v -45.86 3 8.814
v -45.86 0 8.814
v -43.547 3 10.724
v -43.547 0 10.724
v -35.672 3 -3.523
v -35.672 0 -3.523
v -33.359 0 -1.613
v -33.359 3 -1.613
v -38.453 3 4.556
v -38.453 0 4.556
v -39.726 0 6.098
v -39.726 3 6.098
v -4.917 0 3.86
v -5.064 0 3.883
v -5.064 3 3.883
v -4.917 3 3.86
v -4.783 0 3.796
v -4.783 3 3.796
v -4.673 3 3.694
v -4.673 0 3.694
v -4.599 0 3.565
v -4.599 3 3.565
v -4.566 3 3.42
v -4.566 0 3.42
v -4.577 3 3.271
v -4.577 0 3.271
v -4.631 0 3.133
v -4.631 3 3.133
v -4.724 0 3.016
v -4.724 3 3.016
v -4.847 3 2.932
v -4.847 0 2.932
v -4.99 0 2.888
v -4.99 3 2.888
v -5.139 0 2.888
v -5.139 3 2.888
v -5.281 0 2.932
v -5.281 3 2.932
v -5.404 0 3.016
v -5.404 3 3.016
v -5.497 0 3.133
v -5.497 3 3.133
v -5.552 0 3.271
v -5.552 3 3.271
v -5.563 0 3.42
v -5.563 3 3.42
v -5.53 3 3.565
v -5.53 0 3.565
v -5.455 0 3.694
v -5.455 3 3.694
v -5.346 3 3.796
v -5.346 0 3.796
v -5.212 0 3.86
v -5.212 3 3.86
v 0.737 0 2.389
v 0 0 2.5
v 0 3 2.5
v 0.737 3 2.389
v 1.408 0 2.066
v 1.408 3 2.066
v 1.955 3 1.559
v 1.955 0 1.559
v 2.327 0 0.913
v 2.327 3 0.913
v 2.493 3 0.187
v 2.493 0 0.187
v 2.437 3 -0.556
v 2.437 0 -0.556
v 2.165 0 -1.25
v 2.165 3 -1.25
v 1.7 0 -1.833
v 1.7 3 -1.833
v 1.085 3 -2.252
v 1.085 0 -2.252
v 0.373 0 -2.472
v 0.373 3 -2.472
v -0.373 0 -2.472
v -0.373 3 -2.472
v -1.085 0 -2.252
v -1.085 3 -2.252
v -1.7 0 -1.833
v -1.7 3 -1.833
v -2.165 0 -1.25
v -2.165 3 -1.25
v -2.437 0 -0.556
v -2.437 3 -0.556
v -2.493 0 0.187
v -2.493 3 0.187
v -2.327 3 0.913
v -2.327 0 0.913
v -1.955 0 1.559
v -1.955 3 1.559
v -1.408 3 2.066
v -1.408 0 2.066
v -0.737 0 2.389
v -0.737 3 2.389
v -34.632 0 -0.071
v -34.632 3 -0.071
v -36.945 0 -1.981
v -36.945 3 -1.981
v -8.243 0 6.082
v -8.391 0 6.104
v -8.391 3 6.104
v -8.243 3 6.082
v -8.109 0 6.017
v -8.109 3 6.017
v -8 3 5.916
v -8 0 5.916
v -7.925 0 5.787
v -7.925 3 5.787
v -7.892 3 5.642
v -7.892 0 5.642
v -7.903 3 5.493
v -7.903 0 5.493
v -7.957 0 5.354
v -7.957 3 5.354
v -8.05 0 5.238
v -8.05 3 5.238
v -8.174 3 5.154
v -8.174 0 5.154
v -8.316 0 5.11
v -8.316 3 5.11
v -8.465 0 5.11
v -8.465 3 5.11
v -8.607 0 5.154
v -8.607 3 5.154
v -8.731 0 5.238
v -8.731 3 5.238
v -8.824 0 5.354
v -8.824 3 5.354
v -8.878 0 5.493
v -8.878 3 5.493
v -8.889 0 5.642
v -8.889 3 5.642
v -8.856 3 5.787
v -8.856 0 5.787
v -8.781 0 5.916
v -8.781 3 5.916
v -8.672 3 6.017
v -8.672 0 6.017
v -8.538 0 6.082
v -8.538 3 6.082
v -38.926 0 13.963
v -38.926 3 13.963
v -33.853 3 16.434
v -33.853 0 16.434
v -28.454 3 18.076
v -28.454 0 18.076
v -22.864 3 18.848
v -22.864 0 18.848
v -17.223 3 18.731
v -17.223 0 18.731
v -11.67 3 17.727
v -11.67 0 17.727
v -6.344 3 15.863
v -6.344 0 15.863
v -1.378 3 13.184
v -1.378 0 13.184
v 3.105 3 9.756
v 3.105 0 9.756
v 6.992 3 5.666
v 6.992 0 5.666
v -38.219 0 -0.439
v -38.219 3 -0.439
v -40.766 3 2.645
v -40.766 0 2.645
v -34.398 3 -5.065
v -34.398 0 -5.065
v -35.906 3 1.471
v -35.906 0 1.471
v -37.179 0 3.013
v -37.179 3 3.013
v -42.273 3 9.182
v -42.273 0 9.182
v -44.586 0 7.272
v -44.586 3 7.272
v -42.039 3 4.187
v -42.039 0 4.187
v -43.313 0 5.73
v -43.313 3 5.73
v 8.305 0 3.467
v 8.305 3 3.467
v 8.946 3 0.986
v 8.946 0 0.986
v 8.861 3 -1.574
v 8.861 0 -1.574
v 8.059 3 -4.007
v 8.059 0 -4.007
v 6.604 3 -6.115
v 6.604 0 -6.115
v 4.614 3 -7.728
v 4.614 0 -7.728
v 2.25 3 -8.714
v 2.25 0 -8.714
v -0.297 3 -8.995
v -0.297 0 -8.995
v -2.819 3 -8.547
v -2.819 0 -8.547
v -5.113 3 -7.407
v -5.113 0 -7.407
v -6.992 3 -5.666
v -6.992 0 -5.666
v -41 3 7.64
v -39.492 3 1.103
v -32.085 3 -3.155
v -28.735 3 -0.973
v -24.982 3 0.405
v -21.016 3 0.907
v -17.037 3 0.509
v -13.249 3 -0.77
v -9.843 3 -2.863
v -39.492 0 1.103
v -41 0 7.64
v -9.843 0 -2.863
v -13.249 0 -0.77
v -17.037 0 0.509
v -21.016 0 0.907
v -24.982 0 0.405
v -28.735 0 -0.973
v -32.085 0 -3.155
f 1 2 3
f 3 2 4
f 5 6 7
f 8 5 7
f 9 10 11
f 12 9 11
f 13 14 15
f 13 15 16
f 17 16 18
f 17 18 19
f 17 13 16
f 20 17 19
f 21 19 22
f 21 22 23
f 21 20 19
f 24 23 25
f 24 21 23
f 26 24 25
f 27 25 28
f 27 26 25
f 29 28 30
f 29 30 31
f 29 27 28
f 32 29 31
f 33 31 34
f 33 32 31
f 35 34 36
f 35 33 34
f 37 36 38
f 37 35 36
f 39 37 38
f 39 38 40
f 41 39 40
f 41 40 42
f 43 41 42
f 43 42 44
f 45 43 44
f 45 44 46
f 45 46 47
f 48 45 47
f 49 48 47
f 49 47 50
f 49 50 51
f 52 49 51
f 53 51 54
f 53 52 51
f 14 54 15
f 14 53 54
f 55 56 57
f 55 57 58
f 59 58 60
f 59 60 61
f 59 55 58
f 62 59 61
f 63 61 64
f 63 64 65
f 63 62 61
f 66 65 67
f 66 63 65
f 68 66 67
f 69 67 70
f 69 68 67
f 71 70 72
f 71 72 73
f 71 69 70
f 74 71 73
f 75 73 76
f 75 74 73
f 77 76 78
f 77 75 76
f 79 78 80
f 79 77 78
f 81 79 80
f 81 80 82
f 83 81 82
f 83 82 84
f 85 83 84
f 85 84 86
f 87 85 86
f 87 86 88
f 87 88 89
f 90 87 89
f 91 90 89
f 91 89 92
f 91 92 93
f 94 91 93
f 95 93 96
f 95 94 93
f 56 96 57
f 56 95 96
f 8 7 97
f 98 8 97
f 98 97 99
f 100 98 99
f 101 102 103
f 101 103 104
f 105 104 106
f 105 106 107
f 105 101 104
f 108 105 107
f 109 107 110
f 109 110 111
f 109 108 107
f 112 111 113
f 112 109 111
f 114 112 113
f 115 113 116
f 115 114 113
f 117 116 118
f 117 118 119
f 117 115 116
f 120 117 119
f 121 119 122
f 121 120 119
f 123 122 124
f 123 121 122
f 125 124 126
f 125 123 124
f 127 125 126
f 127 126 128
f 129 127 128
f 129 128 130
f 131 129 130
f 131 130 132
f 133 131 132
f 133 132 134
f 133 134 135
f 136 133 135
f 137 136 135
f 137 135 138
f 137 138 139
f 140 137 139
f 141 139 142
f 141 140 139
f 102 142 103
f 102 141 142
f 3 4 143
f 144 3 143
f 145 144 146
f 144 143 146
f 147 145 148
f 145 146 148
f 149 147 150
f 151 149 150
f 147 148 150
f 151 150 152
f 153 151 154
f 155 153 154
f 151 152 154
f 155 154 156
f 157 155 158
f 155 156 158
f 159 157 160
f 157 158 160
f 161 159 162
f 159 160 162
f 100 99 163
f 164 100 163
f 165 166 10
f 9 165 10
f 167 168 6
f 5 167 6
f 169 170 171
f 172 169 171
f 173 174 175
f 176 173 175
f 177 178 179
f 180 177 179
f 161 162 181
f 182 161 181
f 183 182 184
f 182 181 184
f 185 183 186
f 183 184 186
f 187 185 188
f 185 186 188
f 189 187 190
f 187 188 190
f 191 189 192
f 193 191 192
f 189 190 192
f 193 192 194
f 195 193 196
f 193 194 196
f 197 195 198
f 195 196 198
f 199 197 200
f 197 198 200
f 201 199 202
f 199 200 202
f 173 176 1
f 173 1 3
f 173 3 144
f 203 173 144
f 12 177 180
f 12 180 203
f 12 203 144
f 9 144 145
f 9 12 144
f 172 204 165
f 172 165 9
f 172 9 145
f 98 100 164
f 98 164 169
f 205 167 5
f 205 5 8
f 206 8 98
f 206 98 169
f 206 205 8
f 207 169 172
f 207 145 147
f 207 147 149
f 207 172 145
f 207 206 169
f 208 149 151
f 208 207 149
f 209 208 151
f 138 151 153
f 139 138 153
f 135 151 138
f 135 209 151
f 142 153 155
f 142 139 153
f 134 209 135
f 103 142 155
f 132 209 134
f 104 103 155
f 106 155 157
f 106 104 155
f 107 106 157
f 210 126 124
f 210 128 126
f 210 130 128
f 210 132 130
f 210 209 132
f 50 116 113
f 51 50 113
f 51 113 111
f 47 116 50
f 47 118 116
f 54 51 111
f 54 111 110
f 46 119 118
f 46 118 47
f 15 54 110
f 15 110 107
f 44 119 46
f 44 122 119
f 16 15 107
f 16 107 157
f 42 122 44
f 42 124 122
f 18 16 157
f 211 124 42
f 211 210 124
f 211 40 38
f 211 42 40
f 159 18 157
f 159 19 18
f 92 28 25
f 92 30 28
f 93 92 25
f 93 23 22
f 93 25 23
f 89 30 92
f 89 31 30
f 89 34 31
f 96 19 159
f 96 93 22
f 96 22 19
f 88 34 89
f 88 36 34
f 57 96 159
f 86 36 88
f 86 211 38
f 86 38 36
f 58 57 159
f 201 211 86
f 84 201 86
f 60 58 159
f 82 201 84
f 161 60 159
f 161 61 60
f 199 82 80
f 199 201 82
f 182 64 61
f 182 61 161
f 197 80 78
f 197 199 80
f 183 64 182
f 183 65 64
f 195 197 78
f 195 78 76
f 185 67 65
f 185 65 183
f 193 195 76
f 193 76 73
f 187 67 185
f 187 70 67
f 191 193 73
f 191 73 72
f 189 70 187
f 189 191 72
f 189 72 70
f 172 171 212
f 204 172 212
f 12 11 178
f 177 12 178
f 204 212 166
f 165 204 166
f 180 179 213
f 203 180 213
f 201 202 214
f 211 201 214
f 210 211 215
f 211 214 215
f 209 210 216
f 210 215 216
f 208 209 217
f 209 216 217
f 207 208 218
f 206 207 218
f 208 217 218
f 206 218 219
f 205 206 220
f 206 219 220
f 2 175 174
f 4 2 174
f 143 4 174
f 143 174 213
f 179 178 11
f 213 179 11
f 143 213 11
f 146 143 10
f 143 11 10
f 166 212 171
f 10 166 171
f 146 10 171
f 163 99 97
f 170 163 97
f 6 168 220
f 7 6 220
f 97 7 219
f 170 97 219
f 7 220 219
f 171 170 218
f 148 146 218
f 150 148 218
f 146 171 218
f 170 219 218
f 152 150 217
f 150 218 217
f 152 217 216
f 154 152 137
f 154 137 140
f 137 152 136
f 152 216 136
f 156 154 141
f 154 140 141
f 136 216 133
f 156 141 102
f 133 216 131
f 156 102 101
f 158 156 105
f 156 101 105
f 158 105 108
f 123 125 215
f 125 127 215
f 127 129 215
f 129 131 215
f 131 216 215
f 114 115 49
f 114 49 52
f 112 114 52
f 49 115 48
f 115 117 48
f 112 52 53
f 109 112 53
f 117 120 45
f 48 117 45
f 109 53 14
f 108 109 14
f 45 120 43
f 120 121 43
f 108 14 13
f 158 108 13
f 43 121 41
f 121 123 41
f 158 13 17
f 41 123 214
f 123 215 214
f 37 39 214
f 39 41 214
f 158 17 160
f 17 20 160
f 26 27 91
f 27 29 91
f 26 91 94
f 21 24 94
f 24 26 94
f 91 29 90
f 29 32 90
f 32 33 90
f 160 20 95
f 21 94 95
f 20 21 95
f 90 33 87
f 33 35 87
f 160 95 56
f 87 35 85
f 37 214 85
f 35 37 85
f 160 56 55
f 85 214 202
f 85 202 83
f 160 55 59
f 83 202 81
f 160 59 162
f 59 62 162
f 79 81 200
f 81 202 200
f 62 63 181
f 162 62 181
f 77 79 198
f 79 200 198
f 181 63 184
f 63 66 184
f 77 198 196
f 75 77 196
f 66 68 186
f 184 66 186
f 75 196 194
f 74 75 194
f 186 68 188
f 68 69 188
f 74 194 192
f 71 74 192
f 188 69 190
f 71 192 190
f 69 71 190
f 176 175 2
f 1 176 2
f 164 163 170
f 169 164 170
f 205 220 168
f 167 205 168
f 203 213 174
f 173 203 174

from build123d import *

# Parameters (mm, degrees)
SKETCH1_R           = 2.5
SKETCH1_R_2         = 0.5
BOSS_EXTRUDE1_DEPTH = 3


with BuildPart() as part:
    # Sketch1 → Boss-Extrude1 (new body)
    with BuildSketch(Plane(origin=(0, 0, 0), x_dir=(1, 0, 0), z_dir=(0, 1, 0))):
        with BuildLine():
            Line((-33.358616029, 1.612959212), (-34.632118724, 0.070820799))
            Line((-34.632118724, 0.070820799), (-36.945326344, 1.981074841))
            Line((-36.945326344, 1.981074841), (-38.218829039, 0.438936428))
            Line((-38.218829039, 0.438936428), (-35.905621419, -1.471317615))
            Line((-35.905621419, -1.471317615), (-37.179124114, -3.013456028))
            Line((-37.179124114, -3.013456028), (-39.492331734, -1.103201985))
            Line((-39.492331734, -1.103201985), (-40.765834429, -2.645340399))
            Line((-40.765834429, -2.645340399), (-38.452626808, -4.555594441))
            Line((-38.452626808, -4.555594441), (-39.726129503, -6.097732855))
            Line((-39.726129503, -6.097732855), (-42.039337123, -4.187478812))
            Line((-42.039337123, -4.187478812), (-43.312839818, -5.729617226))
            Line((-43.312839818, -5.729617226), (-40.999632198, -7.639871268))
            Line((-40.999632198, -7.639871268), (-42.273134893, -9.182009681))
            Line((-42.273134893, -9.182009681), (-44.586342513, -7.271755639))
            Line((-44.586342513, -7.271755639), (-45.859845208, -8.813894052))
            Line((-45.859845208, -8.813894052), (-43.546637588, -10.724148095))
            ThreePointArc((-43.546637588, -10.724148095), (-17.222782933, -18.730729797), (6.992336159, -5.66632465))
            ThreePointArc((6.992336159, -5.66632465), (5.66632465, 6.992336159), (-6.992336159, 5.66632465))
            ThreePointArc((-6.992336159, 5.66632465), (-19.015227456, -0.820198185), (-32.085113334, 3.155097626))
            Line((-32.085113334, 3.155097626), (-34.398320954, 5.065351668))
            Line((-34.398320954, 5.065351668), (-35.671823649, 3.523213255))
            Line((-35.671823649, 3.523213255), (-33.358616029, 1.612959212))
        make_face()
        with Locations(Location((0, 0, 0), (0, 0, 270))):
            Circle(SKETCH1_R, mode=Mode.SUBTRACT)
        with Locations(Location((-5.06424038, -3.382538894, 0), (0, 0, 270))):
            Circle(SKETCH1_R_2, mode=Mode.SUBTRACT)
        with Locations(Location((-8.39050664, -5.604239317, 0), (0, 0, 270))):
            Circle(SKETCH1_R_2, mode=Mode.SUBTRACT)
    extrude(amount=BOSS_EXTRUDE1_DEPTH)


solid = part.part
